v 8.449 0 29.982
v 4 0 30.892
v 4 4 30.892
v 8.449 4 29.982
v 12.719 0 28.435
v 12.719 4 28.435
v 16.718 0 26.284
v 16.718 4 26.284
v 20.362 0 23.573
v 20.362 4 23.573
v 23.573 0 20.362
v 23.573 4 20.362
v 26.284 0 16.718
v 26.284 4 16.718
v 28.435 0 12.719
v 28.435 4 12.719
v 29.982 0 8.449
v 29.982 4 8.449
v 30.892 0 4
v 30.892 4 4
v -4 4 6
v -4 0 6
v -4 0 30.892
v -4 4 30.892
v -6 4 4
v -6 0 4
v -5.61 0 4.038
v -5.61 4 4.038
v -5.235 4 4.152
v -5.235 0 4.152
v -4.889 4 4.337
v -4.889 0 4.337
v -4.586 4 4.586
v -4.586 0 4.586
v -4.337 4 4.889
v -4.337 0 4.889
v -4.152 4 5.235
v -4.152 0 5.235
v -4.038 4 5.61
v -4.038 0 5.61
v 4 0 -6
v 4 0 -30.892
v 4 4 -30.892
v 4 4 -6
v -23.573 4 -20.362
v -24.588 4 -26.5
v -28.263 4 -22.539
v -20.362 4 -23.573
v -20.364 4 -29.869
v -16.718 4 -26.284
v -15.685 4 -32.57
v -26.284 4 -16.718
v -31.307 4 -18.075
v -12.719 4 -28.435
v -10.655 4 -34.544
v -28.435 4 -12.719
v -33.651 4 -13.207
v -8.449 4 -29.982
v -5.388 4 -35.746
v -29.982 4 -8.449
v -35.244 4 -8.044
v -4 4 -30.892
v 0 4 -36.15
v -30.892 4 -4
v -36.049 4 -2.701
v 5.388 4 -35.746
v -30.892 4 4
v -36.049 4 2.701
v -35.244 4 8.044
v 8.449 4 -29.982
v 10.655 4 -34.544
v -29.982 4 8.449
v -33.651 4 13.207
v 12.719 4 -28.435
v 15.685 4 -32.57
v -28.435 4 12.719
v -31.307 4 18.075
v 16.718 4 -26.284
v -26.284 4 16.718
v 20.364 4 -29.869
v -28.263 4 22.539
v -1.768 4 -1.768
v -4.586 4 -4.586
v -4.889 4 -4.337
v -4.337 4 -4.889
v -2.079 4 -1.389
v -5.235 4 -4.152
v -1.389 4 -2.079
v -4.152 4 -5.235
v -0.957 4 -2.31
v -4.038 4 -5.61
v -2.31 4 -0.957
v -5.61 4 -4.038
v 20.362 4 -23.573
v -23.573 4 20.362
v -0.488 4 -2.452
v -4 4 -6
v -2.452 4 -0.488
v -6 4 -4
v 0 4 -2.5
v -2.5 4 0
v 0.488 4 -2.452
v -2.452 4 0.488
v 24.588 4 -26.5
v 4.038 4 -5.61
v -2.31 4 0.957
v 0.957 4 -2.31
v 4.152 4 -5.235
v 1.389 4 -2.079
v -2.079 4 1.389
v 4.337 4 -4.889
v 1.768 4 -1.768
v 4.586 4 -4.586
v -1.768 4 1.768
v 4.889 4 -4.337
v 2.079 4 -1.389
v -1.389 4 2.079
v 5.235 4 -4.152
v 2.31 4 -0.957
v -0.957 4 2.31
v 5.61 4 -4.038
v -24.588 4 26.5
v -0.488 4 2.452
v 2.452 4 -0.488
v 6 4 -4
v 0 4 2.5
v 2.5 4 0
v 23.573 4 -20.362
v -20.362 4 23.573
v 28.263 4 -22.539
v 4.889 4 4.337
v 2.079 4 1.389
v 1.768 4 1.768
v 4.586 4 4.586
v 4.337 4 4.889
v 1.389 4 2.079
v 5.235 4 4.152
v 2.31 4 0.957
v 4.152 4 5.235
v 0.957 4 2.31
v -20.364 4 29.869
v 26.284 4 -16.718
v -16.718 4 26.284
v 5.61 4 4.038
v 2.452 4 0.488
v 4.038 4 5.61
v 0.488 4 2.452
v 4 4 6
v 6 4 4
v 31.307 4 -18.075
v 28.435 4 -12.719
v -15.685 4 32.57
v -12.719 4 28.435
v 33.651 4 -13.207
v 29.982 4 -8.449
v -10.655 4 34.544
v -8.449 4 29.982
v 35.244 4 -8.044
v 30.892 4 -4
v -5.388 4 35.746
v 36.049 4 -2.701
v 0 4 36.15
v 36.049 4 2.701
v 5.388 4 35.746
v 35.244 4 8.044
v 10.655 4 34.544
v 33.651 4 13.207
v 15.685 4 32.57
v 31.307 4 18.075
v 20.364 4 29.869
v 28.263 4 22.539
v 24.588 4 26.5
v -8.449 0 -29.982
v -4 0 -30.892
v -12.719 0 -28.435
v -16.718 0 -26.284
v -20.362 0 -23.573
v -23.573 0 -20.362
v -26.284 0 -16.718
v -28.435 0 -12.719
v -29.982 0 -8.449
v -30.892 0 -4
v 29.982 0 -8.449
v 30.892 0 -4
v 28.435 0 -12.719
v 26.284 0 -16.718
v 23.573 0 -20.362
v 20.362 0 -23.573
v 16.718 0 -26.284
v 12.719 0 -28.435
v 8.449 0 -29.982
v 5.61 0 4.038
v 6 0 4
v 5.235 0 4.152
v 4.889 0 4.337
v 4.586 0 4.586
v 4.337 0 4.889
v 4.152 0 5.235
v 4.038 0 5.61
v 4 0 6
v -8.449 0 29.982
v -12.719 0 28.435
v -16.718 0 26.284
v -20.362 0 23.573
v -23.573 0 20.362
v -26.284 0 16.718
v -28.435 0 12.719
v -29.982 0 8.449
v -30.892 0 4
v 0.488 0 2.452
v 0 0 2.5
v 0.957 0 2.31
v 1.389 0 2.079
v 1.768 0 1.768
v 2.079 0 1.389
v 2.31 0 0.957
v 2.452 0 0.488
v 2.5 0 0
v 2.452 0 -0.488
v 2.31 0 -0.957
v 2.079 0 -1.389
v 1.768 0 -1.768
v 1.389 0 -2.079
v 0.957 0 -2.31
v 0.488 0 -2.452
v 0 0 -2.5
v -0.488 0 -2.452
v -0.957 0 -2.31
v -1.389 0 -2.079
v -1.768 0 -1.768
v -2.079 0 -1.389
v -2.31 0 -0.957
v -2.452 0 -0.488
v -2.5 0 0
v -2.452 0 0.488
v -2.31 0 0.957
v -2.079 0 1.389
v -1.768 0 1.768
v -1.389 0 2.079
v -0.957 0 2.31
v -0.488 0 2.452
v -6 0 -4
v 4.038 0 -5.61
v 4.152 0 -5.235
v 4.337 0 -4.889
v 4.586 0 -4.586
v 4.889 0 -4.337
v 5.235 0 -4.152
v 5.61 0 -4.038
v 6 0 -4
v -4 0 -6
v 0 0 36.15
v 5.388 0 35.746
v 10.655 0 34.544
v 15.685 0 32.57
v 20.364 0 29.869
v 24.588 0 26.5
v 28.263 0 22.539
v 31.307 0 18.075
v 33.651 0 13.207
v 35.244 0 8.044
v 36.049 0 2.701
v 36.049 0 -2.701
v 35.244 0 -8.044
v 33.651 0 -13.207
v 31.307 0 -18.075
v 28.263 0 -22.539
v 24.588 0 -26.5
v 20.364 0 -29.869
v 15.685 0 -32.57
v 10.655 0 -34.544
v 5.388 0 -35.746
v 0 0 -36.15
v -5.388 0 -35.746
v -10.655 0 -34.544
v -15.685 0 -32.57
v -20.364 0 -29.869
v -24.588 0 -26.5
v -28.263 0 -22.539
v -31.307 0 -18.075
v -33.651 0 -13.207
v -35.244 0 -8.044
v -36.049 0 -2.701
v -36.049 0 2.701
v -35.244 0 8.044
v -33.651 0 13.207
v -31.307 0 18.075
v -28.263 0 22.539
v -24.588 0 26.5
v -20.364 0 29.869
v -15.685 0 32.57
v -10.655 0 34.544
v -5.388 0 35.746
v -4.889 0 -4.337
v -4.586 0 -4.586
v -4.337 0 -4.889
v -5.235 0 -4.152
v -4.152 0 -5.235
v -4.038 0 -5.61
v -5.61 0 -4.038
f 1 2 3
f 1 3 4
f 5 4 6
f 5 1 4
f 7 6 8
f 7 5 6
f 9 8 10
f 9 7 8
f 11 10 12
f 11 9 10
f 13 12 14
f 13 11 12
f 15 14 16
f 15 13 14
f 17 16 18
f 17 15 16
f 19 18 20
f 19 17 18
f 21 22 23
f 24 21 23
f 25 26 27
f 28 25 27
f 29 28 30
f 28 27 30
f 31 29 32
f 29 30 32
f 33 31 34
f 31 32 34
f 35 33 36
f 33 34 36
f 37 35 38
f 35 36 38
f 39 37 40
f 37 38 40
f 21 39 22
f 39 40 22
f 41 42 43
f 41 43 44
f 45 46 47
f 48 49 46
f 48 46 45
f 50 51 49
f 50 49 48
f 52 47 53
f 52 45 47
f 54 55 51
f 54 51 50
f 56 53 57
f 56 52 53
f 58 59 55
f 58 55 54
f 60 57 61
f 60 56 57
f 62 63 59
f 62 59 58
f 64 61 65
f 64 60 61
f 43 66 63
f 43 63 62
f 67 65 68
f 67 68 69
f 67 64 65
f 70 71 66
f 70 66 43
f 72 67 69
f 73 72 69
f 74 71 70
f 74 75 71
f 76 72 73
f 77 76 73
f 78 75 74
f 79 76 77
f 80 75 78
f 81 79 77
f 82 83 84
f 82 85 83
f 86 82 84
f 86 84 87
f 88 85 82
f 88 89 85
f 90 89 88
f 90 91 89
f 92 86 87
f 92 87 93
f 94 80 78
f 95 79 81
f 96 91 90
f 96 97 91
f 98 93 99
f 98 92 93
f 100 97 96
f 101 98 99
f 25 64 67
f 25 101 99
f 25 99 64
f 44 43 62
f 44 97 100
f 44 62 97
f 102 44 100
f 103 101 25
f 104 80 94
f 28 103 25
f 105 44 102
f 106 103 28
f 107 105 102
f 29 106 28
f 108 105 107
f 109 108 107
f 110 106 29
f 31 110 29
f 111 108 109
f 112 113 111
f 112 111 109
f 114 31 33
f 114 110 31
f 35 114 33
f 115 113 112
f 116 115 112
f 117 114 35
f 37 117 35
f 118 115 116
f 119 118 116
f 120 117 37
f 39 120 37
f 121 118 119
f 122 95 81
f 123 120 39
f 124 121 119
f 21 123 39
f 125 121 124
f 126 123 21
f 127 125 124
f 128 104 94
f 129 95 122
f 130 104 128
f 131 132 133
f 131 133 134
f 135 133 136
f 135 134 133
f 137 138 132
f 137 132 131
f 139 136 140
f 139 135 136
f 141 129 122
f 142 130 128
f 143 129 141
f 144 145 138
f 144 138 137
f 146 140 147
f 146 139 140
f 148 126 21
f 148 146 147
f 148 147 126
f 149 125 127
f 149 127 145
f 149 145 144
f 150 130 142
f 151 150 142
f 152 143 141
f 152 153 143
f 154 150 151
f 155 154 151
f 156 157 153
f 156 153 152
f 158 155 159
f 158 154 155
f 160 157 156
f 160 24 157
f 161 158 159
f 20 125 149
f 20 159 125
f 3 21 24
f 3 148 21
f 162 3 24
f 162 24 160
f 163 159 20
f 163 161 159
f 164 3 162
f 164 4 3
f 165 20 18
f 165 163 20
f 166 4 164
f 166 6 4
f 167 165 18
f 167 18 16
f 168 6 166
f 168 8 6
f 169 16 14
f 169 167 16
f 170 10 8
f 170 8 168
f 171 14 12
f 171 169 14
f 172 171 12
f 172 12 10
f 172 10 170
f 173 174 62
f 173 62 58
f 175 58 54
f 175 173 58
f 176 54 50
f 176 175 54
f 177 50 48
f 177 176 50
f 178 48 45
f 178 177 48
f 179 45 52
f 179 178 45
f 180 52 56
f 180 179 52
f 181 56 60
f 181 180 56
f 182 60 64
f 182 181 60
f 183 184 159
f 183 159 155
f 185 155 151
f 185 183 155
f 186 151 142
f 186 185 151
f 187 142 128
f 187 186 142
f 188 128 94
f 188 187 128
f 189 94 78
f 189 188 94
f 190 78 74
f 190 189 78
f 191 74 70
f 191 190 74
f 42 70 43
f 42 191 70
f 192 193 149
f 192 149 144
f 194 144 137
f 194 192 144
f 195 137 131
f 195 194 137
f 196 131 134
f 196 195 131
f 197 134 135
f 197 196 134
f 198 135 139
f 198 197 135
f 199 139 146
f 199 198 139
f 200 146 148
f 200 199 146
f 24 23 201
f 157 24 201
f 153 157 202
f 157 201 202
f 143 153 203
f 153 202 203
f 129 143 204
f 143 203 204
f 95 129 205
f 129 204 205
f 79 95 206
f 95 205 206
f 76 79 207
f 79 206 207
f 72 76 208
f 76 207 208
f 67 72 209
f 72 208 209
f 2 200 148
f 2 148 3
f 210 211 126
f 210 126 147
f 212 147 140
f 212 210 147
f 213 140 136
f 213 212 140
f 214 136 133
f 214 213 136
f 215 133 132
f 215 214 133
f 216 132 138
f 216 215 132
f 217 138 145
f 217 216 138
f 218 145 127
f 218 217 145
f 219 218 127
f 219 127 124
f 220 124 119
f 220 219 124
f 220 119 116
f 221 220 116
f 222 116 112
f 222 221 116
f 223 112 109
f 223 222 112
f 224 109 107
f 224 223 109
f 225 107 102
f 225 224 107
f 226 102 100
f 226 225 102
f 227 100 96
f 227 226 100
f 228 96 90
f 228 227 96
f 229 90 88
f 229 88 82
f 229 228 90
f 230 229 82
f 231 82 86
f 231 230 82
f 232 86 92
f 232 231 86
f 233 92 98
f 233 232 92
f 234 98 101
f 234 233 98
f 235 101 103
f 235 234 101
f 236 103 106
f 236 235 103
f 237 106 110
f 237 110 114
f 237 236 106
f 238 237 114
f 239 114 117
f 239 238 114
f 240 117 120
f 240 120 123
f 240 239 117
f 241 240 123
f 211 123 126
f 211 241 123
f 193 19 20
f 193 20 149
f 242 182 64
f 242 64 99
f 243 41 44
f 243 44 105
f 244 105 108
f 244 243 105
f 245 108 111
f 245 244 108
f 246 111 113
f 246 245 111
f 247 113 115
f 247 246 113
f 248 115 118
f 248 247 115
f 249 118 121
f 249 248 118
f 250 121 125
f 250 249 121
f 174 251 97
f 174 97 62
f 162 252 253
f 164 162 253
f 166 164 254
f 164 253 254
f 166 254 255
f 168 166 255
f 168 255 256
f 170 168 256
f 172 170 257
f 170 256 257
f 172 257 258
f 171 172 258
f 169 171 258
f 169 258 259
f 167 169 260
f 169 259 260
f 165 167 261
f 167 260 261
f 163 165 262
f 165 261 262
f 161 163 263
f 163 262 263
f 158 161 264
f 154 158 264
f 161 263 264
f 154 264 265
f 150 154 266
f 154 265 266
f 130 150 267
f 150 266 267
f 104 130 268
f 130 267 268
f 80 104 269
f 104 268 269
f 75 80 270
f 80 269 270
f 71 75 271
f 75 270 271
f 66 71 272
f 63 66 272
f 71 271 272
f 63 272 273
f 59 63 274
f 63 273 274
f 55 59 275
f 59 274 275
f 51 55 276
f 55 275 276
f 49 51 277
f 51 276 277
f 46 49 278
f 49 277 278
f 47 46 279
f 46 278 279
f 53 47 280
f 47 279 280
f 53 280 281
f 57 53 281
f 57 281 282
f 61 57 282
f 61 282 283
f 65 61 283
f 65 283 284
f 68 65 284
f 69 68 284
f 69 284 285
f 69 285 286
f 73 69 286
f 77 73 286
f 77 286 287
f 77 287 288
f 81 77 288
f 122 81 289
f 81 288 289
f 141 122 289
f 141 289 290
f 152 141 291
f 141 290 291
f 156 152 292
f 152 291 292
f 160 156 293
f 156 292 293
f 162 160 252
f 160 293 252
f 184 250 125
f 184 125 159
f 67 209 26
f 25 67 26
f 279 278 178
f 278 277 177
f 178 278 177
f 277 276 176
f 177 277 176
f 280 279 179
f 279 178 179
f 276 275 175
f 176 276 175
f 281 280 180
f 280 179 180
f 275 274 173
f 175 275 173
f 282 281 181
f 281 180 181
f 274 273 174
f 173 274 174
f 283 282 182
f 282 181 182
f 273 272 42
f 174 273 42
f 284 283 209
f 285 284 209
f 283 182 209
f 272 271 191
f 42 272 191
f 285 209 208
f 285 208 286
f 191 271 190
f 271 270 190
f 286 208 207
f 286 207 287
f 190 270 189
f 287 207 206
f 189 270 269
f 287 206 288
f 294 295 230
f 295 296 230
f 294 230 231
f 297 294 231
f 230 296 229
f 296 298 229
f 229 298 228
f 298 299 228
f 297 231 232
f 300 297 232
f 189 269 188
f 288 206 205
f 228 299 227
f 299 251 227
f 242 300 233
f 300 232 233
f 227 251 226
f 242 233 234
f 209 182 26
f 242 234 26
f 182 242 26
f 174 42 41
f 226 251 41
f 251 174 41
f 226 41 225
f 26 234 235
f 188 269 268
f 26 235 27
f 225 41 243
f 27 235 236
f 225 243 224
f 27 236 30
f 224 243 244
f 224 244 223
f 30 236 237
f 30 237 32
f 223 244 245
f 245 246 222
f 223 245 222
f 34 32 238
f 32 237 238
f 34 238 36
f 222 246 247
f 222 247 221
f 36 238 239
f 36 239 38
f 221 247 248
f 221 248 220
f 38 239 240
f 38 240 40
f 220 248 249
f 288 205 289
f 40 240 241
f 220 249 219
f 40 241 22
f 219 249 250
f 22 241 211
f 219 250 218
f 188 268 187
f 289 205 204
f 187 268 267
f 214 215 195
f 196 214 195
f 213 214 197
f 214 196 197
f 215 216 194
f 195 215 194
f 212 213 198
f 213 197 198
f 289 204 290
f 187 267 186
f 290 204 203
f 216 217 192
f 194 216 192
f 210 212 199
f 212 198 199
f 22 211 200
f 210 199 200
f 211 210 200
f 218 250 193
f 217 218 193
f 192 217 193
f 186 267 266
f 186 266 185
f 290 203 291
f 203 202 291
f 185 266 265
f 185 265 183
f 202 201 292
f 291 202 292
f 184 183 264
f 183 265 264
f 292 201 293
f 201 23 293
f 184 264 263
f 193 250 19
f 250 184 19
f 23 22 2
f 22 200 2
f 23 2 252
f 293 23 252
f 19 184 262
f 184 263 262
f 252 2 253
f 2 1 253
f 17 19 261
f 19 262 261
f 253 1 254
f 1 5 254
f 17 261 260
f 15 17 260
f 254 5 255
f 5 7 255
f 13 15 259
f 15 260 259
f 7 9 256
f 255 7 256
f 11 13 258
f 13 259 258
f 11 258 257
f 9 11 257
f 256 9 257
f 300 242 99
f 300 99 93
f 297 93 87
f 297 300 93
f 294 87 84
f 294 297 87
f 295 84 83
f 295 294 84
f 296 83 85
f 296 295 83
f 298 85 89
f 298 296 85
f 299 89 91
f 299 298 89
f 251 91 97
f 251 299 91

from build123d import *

# Parameters (mm, degrees)
SKETCH1_R           = 36.15
SKETCH1_R_2         = 2.5
BOSS_EXTRUDE1_DEPTH = 4


with BuildPart() as part:
    # Sketch1 → Boss-Extrude1 (new body)
    with BuildSketch(Plane(origin=(0, 0, 0), x_dir=(1, 0, 0), z_dir=(0, 1, 0))):
        with Locations(Location((0, 0, 0), (0, 0, 270))):
            Circle(SKETCH1_R)
        with Locations(Location((0, 0, 0), (0, 0, 270))):
            Circle(SKETCH1_R_2, mode=Mode.SUBTRACT)
        with BuildLine():
            ThreePointArc((4, -30.892110643), (22.026376234, -22.026376234), (30.892110643, -4))
            Line((30.892110643, -4), (6, -4))
            ThreePointArc((6, -4), (4.585786438, -4.585786438), (4, -6))
            Line((4, -6), (4, -30.892110643))
        make_face(mode=Mode.SUBTRACT)
        with BuildLine():
            ThreePointArc((30.892110643, 4), (22.026376234, 22.026376234), (4, 30.892110643))
            Line((4, 30.892110643), (4, 6))
            ThreePointArc((4, 6), (4.585786438, 4.585786438), (6, 4))
            Line((6, 4), (30.892110643, 4))
        make_face(mode=Mode.SUBTRACT)
        with BuildLine():
            ThreePointArc((-4, 30.892110643), (-22.026376234, 22.026376234), (-30.892110643, 4))
            Line((-30.892110643, 4), (-6, 4))
            ThreePointArc((-6, 4), (-4.585786438, 4.585786438), (-4, 6))
            Line((-4, 6), (-4, 30.892110643))
        make_face(mode=Mode.SUBTRACT)
        with BuildLine():
            Line((-30.892110643, -4), (-6, -4))
            ThreePointArc((-6, -4), (-4.585786438, -4.585786438), (-4, -6))
            Line((-4, -6), (-4, -30.892110643))
            ThreePointArc((-4, -30.892110643), (-22.026376234, -22.026376234), (-30.892110643, -4))
        make_face(mode=Mode.SUBTRACT)
    extrude(amount=BOSS_EXTRUDE1_DEPTH)


solid = part.part
